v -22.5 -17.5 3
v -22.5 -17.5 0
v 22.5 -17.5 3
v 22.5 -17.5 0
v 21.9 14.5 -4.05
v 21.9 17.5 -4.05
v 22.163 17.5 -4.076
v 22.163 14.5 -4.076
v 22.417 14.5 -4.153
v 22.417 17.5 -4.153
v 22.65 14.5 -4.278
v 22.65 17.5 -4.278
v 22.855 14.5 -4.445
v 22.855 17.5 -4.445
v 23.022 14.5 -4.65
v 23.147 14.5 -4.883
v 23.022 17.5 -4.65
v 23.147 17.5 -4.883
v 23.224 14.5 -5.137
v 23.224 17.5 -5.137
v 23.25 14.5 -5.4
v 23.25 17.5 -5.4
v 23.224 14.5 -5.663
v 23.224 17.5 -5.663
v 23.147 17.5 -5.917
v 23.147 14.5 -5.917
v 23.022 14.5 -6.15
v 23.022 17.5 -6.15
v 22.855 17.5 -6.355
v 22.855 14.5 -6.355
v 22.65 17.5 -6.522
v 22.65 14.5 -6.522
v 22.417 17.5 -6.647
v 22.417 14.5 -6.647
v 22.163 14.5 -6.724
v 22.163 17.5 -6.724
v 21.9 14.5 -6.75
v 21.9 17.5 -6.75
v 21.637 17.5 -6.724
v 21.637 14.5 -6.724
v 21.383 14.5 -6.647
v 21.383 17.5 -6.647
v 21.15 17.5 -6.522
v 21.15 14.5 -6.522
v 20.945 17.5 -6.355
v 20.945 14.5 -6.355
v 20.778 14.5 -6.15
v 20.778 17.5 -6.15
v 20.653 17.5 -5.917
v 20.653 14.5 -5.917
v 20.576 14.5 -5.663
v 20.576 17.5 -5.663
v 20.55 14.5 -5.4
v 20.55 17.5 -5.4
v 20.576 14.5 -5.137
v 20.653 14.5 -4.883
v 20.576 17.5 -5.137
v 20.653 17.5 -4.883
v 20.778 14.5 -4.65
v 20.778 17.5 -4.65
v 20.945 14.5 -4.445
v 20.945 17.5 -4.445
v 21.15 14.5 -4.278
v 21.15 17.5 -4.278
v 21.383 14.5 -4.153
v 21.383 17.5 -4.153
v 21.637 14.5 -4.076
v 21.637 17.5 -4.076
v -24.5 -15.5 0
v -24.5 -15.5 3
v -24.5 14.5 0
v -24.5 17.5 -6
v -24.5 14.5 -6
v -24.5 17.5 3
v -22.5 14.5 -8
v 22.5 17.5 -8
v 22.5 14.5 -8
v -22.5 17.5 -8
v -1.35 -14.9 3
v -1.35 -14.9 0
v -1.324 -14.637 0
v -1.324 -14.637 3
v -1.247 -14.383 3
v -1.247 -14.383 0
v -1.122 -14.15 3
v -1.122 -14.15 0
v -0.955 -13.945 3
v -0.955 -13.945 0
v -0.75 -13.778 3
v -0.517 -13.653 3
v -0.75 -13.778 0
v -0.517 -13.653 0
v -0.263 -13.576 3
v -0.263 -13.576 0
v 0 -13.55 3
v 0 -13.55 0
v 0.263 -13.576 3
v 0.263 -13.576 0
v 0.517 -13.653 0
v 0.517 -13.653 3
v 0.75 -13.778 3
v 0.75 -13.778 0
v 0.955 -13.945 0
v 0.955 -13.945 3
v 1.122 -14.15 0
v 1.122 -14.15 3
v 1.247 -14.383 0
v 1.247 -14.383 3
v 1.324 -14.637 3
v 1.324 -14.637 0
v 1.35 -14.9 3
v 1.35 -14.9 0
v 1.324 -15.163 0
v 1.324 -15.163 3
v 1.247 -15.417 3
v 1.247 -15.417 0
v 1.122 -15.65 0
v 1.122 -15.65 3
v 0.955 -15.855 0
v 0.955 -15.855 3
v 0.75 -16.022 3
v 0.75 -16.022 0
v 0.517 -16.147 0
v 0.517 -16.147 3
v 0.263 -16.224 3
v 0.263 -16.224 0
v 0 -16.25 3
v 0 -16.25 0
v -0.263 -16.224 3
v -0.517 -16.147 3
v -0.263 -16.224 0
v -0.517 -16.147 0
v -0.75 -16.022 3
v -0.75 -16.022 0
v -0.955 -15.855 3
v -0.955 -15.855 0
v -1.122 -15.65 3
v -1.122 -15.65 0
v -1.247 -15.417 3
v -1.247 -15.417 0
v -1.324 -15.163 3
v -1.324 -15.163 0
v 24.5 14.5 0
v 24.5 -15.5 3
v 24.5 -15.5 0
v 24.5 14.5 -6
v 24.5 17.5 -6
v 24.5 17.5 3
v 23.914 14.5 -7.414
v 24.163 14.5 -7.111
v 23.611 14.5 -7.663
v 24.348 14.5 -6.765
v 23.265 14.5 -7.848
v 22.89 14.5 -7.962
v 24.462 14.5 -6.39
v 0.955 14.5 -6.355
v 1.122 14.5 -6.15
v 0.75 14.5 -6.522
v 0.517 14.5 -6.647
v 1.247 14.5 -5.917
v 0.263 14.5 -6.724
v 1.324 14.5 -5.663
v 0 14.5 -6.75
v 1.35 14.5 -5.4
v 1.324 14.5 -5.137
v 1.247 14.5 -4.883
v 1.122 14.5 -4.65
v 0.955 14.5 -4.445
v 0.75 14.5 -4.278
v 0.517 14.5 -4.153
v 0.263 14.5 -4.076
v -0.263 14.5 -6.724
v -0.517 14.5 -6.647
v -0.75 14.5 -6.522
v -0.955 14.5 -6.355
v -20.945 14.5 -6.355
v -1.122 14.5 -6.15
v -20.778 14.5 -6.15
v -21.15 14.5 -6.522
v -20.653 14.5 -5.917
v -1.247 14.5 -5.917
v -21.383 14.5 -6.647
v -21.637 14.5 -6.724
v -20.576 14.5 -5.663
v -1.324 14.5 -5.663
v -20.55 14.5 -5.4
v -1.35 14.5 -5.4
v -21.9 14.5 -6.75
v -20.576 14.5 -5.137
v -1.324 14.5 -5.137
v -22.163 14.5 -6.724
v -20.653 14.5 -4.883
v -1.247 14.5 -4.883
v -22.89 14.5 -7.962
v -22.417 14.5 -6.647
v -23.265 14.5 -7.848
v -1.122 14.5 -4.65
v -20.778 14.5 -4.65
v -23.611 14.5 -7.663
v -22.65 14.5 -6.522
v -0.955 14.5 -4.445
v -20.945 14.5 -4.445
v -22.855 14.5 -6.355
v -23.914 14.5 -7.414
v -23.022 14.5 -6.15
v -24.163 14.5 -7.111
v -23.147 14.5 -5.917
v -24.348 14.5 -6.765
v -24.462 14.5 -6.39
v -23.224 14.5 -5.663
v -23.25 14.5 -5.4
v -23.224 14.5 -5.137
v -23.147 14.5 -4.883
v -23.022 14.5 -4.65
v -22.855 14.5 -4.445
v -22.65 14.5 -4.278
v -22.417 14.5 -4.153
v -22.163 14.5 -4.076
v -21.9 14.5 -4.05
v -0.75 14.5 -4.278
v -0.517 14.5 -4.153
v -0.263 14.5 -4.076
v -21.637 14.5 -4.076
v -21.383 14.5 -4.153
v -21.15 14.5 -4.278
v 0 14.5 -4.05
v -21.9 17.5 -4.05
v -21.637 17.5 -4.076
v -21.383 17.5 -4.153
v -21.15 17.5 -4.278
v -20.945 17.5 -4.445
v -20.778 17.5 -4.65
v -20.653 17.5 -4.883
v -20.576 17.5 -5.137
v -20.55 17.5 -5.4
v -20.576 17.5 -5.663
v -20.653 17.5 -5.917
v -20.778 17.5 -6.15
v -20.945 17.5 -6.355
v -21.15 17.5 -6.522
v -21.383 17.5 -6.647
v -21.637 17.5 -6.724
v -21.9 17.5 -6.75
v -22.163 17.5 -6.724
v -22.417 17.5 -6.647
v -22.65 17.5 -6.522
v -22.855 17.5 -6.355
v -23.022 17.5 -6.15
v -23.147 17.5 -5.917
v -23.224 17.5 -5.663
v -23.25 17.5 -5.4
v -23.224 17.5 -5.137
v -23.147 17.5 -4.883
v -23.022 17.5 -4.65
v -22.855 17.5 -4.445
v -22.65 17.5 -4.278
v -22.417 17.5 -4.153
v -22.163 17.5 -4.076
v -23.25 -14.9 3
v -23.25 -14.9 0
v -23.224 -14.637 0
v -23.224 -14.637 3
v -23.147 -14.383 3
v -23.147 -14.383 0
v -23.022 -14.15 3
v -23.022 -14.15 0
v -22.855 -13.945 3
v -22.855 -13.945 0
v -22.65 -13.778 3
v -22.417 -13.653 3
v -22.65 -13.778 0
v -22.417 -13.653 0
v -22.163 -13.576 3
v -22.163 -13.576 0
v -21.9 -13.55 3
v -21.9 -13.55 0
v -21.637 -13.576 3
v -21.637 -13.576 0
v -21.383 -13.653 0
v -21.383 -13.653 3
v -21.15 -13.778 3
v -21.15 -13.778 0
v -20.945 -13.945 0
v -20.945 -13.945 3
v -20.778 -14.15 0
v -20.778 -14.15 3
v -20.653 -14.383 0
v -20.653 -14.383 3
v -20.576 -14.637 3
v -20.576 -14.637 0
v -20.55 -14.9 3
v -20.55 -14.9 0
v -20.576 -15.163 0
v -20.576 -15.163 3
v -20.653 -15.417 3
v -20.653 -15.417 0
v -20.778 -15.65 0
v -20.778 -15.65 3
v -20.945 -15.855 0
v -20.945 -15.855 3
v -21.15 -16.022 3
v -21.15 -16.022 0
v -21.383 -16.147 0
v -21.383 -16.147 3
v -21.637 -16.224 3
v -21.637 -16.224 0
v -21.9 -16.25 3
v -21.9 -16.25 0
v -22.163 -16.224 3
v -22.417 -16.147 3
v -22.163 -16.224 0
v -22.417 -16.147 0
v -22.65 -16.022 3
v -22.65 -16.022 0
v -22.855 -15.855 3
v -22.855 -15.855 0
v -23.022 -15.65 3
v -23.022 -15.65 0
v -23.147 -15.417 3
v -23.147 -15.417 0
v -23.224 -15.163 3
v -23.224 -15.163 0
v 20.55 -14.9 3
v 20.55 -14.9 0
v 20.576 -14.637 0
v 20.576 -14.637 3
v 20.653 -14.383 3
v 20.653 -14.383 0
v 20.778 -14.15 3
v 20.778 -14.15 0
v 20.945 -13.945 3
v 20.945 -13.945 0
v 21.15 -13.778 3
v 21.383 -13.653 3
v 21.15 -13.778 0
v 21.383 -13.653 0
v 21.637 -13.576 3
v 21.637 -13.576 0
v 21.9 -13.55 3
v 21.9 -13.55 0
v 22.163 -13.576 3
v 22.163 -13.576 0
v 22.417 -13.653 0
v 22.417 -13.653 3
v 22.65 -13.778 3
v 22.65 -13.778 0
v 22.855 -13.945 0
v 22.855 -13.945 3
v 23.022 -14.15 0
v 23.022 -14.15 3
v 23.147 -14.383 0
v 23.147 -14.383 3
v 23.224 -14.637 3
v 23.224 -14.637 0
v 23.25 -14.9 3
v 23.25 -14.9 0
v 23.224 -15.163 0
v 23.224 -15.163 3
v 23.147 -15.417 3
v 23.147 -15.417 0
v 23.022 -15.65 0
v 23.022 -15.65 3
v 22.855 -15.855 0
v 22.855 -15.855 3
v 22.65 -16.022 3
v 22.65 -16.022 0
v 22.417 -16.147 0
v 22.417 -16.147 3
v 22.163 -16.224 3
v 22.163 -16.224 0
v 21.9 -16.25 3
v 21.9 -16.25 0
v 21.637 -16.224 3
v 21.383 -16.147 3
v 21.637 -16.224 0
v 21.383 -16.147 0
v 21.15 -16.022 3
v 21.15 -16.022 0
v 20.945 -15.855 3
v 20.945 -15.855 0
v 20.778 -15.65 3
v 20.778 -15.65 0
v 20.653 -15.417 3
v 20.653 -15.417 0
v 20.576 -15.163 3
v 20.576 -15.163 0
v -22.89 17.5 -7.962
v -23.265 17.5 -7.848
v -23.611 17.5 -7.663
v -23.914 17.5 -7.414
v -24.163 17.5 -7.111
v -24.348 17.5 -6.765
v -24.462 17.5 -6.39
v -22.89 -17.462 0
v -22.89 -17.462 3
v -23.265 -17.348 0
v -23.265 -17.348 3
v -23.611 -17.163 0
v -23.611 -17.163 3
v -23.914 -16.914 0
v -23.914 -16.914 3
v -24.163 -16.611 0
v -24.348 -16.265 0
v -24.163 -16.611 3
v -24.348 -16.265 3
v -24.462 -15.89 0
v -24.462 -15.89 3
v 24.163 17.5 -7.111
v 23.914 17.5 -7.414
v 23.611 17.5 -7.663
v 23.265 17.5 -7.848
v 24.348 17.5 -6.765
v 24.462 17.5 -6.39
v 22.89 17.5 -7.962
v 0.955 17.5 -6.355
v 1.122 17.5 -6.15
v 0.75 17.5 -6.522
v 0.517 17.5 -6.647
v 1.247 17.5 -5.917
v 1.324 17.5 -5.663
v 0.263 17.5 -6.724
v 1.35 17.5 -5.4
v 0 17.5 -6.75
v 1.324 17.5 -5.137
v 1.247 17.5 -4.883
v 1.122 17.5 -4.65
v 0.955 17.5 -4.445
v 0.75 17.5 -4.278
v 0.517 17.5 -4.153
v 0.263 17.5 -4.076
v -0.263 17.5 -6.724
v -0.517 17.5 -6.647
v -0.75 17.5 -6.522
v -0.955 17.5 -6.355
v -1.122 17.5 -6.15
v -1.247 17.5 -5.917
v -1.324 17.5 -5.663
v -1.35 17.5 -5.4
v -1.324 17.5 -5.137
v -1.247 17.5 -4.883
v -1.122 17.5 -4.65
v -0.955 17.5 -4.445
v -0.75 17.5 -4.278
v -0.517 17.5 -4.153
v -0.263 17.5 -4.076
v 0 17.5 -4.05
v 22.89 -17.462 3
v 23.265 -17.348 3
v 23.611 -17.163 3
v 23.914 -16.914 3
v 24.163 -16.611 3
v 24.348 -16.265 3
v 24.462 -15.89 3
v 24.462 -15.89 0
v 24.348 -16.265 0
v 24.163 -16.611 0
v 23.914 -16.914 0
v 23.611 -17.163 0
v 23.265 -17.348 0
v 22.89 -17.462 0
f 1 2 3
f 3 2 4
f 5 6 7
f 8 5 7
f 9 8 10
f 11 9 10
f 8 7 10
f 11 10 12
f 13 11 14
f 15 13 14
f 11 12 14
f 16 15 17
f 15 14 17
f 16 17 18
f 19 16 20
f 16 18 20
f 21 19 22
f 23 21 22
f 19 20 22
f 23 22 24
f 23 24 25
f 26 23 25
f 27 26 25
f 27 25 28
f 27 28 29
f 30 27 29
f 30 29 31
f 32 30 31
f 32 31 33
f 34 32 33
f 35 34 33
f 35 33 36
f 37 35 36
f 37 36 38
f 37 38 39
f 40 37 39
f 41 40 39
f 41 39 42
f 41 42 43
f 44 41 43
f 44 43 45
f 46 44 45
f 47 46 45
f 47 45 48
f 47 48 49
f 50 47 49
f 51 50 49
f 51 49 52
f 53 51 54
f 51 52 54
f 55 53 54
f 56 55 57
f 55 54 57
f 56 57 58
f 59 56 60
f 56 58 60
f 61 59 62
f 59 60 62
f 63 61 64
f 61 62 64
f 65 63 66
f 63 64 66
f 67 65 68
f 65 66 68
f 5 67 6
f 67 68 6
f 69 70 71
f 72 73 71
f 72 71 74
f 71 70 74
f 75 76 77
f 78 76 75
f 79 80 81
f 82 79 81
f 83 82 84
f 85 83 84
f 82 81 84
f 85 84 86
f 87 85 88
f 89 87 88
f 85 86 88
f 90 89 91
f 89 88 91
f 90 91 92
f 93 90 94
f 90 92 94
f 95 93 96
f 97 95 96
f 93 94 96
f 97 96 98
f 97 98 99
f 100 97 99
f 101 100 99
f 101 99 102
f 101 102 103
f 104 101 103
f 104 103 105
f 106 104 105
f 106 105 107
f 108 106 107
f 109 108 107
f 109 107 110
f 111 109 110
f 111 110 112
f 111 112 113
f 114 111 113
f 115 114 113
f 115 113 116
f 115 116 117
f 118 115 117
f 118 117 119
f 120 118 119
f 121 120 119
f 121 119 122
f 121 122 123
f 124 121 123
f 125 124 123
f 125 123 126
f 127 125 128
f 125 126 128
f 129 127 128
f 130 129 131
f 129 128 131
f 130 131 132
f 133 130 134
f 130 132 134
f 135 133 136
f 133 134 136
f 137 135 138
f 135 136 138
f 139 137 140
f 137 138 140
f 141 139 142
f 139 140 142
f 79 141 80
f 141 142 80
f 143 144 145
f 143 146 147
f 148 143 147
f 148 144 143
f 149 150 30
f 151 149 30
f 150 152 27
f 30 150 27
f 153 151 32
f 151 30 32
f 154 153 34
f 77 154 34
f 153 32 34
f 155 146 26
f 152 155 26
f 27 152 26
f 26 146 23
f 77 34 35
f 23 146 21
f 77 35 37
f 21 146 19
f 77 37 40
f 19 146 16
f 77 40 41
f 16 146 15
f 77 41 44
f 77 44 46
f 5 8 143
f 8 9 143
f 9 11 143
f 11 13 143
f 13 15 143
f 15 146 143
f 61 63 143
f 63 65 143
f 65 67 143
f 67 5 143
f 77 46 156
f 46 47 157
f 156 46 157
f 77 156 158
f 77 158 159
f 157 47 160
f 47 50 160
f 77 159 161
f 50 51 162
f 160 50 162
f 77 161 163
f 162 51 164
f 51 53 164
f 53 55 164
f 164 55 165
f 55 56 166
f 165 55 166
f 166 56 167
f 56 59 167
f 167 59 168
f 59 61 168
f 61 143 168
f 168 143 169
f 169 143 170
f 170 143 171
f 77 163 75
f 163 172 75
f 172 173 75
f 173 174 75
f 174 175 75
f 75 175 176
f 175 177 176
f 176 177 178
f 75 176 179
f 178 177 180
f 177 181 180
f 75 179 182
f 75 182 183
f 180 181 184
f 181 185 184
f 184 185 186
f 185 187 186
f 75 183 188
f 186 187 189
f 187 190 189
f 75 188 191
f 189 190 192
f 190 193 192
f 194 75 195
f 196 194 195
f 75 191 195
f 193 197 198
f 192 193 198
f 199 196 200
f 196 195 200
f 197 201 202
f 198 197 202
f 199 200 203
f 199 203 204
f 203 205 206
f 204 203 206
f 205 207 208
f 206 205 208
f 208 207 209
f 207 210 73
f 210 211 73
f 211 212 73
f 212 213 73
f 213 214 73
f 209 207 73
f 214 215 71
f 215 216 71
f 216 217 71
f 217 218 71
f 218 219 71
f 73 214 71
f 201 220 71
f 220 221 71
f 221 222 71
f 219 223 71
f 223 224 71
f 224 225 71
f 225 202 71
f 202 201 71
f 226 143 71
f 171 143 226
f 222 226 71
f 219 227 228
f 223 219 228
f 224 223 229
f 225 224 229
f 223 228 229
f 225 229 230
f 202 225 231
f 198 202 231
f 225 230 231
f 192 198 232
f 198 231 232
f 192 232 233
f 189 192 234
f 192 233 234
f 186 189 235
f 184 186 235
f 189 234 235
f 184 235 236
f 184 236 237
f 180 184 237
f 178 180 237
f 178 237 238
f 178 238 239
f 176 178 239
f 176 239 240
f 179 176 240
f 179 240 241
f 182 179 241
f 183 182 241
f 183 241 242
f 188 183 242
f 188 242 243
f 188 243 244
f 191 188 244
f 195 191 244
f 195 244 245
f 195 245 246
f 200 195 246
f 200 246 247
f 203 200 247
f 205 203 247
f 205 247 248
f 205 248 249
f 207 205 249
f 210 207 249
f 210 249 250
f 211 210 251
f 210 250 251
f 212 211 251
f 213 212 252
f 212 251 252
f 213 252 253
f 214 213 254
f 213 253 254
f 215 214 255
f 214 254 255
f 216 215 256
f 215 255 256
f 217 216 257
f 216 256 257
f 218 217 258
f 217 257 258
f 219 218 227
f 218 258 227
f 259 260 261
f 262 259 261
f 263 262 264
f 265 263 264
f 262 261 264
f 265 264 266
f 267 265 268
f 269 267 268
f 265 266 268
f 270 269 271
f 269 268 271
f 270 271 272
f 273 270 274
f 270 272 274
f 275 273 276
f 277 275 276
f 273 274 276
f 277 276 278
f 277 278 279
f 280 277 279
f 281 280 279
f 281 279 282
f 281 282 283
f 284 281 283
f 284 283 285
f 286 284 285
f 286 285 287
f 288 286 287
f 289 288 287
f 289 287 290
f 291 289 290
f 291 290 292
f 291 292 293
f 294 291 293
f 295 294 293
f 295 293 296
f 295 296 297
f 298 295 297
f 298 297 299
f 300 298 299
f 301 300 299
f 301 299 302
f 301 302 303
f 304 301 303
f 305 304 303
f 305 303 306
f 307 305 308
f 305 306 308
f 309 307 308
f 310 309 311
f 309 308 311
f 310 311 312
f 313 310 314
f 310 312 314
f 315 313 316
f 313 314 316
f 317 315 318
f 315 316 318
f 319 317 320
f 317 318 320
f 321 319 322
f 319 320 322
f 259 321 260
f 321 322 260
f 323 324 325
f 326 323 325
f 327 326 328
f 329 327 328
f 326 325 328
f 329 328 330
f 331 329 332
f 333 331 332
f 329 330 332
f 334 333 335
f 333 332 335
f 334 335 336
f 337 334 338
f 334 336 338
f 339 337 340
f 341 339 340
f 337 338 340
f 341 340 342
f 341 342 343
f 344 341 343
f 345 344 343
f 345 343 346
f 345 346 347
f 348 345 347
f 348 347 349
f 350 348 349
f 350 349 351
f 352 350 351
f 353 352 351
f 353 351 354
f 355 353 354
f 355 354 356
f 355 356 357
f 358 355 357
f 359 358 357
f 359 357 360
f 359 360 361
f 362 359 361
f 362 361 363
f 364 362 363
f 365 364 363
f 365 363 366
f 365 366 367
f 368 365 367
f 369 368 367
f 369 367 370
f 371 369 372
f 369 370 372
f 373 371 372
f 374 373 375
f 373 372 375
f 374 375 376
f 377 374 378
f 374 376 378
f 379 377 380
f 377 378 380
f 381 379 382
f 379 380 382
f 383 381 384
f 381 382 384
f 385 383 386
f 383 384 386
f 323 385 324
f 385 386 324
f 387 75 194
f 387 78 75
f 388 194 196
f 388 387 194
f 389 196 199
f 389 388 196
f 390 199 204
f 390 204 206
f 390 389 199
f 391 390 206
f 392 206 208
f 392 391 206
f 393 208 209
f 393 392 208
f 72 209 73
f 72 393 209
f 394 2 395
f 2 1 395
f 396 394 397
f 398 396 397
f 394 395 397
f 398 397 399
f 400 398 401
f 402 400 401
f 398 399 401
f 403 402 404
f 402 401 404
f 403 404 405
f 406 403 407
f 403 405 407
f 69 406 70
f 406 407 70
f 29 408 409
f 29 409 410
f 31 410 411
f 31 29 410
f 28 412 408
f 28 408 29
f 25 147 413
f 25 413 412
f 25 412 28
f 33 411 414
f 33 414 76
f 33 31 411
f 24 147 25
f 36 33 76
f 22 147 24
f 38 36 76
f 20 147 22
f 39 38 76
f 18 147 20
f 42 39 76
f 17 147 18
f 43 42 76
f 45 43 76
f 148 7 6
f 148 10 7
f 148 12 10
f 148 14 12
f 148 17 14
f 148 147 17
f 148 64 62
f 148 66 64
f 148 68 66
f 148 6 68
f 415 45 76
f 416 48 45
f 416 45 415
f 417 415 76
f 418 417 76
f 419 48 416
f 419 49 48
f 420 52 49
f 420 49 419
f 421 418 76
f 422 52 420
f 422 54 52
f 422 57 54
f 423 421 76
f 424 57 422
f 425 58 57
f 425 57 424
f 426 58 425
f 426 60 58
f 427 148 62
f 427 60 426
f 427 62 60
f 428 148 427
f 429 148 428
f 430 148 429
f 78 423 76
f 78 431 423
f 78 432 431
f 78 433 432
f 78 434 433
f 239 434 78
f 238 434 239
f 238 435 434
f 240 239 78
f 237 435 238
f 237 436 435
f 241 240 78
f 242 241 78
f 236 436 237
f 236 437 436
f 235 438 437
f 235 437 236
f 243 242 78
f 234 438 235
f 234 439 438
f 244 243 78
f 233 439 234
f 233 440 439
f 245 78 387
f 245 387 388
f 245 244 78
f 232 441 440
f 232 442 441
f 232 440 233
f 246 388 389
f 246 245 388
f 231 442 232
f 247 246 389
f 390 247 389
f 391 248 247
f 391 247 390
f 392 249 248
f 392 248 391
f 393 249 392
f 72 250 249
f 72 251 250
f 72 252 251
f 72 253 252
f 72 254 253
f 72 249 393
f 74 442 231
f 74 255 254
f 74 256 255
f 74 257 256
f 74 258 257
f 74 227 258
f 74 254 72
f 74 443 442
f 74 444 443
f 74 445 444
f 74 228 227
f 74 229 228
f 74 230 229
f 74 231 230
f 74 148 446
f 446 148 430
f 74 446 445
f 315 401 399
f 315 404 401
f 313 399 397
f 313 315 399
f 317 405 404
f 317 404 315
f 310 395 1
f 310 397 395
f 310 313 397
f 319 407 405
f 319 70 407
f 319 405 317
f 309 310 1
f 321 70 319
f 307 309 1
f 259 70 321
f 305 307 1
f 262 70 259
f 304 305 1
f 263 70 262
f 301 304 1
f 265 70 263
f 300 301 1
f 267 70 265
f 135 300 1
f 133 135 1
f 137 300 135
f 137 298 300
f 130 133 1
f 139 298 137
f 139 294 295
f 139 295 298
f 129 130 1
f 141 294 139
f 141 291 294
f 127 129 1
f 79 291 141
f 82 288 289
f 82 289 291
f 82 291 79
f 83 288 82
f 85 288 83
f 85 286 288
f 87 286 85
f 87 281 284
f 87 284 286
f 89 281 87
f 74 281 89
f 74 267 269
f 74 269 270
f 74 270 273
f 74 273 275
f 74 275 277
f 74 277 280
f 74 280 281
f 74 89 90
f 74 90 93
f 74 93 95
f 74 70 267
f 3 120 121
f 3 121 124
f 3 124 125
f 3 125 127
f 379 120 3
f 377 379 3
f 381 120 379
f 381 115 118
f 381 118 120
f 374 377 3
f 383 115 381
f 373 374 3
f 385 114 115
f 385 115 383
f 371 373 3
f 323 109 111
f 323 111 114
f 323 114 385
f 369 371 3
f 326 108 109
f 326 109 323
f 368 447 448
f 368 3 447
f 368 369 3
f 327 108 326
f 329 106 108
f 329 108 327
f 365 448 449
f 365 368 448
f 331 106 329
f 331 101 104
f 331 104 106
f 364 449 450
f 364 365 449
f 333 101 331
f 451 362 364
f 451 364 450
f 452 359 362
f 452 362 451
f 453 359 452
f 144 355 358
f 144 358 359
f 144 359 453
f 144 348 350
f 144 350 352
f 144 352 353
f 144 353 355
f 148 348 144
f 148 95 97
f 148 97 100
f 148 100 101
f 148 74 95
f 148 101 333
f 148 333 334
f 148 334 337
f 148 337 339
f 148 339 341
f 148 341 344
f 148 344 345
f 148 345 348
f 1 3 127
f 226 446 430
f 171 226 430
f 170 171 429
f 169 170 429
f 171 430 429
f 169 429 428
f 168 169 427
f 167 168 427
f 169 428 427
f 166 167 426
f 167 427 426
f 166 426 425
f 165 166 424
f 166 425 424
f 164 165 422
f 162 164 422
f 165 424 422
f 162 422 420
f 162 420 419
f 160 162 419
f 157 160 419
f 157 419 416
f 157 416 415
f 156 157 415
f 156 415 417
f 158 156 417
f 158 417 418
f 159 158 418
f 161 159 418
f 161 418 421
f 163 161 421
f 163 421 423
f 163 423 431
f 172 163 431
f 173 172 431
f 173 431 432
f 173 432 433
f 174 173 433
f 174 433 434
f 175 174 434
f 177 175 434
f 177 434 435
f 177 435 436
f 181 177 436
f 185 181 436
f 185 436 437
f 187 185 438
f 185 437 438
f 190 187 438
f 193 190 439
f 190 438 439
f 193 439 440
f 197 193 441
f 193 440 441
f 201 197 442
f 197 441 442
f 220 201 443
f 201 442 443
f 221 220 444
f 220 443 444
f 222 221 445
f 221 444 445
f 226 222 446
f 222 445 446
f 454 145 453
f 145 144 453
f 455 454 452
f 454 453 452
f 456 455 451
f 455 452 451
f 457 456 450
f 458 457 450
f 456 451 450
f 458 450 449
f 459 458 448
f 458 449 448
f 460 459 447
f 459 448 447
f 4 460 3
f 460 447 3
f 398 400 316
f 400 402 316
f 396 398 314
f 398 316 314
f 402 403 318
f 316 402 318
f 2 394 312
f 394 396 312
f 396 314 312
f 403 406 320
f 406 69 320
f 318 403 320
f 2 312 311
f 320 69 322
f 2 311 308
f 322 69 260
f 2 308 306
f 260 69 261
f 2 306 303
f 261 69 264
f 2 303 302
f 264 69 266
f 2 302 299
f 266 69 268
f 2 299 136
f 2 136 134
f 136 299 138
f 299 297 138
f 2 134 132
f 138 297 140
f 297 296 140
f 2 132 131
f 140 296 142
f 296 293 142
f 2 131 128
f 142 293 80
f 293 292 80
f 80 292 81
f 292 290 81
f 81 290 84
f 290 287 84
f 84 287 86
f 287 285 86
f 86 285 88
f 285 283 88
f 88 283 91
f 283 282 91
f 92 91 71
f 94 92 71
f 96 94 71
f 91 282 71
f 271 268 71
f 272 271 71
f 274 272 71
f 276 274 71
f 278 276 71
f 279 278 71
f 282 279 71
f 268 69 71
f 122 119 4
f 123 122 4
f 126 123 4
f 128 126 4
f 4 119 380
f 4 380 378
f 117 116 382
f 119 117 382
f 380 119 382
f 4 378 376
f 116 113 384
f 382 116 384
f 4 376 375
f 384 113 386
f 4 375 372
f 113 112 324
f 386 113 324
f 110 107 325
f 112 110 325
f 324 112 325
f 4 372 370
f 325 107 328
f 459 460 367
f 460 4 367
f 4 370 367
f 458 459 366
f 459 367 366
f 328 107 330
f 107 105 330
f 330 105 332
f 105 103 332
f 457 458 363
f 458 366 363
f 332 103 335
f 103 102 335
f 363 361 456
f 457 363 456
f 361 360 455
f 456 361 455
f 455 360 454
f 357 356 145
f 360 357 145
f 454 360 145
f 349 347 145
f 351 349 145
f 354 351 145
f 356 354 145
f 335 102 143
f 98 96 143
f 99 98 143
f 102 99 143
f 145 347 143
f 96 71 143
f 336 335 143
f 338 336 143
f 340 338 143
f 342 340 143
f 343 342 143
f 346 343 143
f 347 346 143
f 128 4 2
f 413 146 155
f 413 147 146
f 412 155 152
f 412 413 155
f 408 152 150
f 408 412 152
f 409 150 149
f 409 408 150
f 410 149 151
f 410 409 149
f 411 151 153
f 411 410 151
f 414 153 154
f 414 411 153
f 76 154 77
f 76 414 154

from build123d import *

# Parameters (mm, degrees)
ESBO_O1_W                = 49
ESBO_O1_H                = 35
RESSALTO_EXTRUS_O1_DEPTH = 3
ESBO_O2_R                = 1.35
CORTE_EXTRUS_O1_DEPTH    = 31.257230541
ESBO_O3_W                = 49
ESBO_O3_H                = 3
RESSALTO_EXTRUS_O3_DEPTH = 8
ESBO_O4_R                = 1.35
CORTE_EXTRUS_O2_DEPTH    = 44.465503563
FILETE1_R                = 2
FILETE2_R                = 2


with BuildPart() as part:
    # Esboço1 → Ressalto-extrusão1 (new body)
    with BuildSketch(Plane.XY):
        Rectangle(ESBO_O1_W, ESBO_O1_H)
    extrude(amount=RESSALTO_EXTRUS_O1_DEPTH)

    # Esboço2 → Corte-extrusão1 (cut, through all)
    with BuildSketch(Plane(origin=(0, 0, 0), x_dir=(-1, 0, 0), z_dir=(0, 0, -1))):
        with Locations((-21.9, -14.9)):
            Circle(ESBO_O2_R)
        with Locations((0, -14.9)):
            Circle(ESBO_O2_R)
        with Locations((21.9, -14.9)):
            Circle(ESBO_O2_R)
    extrude(amount=-CORTE_EXTRUS_O1_DEPTH, mode=Mode.SUBTRACT)

    # Esboço3 → Ressalto-extrusão3 (add)
    with BuildSketch(Plane(origin=(0, 0, 0), x_dir=(-1, 0, 0), z_dir=(0, 0, -1))):
        with Locations((0, 16)):
            Rectangle(ESBO_O3_W, ESBO_O3_H)
    extrude(amount=RESSALTO_EXTRUS_O3_DEPTH)

    # Esboço4 → Corte-extrusão2 (cut, through all)
    with BuildSketch(Plane(origin=(0, 17.5, 0), x_dir=(1, 0, 0), z_dir=(0, 1, 0))):
        with Locations(Location((-21.9, 5.4, 0), (0, 0, 270))):
            Circle(ESBO_O4_R)
        with Locations(Location((0, 5.4, 0), (0, 0, 270))):
            Circle(ESBO_O4_R)
        with Locations(Location((21.9, 5.4, 0), (0, 0, 270))):
            Circle(ESBO_O4_R)
    extrude(amount=-CORTE_EXTRUS_O2_DEPTH, mode=Mode.SUBTRACT)

    # Filete1
    filete1_edges = [part.edges().sort_by_distance(p)[0] for p in [
        (24.5, -17.5, 1.5),
        (-24.5, -17.5, 1.5),
    ]]
    fillet(filete1_edges, radius=FILETE1_R)

    # Filete2
    filete2_edges = [part.edges().sort_by_distance(p)[0] for p in [
        (24.5, 16, -8),
        (-24.5, 16, -8),
    ]]
    fillet(filete2_edges, radius=FILETE2_R)


solid = part.part
